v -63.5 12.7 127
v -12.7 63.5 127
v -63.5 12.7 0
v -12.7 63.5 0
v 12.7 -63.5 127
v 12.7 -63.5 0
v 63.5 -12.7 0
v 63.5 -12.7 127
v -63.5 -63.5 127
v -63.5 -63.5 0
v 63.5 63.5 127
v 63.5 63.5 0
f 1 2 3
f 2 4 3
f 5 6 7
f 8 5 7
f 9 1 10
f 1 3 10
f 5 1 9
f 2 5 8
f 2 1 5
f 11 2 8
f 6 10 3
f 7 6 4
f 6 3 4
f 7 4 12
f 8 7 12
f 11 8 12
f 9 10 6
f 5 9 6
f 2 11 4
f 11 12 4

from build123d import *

# Parameters (mm, degrees)
F0_W     = 127
F0_H     = 127
F1_DEPTH = 101.6
F3_DEPTH = 101.6
F4_DEPTH = 25.4


with BuildPart() as f1:
    # F0 (on Top) → F1 (new body)
    with BuildSketch(Plane.XY):
        Rectangle(F0_W, F0_H)
    extrude(amount=F1_DEPTH)

    # F2 (on face) → F3 (cut)
    with BuildSketch(Plane.XY.offset(101.6)):
        Polygon((-12.7, 63.5), (-63.5, 63.5), (-63.5, 12.7), align=None)
        Polygon((63.5, -63.5), (63.5, -12.7), (12.7, -63.5), align=None)
    extrude(amount=-F3_DEPTH, mode=Mode.SUBTRACT)

    # F1_face (on face) → F4 (join)
    with BuildSketch(Plane.XY.offset(101.6)):
        Polygon((63.5, -12.7), (63.5, 63.5), (-12.7, 63.5), (-63.5, 12.7), (-63.5, -63.5), (12.7, -63.5), align=None)
    extrude(amount=F4_DEPTH)


solid = f1.part
